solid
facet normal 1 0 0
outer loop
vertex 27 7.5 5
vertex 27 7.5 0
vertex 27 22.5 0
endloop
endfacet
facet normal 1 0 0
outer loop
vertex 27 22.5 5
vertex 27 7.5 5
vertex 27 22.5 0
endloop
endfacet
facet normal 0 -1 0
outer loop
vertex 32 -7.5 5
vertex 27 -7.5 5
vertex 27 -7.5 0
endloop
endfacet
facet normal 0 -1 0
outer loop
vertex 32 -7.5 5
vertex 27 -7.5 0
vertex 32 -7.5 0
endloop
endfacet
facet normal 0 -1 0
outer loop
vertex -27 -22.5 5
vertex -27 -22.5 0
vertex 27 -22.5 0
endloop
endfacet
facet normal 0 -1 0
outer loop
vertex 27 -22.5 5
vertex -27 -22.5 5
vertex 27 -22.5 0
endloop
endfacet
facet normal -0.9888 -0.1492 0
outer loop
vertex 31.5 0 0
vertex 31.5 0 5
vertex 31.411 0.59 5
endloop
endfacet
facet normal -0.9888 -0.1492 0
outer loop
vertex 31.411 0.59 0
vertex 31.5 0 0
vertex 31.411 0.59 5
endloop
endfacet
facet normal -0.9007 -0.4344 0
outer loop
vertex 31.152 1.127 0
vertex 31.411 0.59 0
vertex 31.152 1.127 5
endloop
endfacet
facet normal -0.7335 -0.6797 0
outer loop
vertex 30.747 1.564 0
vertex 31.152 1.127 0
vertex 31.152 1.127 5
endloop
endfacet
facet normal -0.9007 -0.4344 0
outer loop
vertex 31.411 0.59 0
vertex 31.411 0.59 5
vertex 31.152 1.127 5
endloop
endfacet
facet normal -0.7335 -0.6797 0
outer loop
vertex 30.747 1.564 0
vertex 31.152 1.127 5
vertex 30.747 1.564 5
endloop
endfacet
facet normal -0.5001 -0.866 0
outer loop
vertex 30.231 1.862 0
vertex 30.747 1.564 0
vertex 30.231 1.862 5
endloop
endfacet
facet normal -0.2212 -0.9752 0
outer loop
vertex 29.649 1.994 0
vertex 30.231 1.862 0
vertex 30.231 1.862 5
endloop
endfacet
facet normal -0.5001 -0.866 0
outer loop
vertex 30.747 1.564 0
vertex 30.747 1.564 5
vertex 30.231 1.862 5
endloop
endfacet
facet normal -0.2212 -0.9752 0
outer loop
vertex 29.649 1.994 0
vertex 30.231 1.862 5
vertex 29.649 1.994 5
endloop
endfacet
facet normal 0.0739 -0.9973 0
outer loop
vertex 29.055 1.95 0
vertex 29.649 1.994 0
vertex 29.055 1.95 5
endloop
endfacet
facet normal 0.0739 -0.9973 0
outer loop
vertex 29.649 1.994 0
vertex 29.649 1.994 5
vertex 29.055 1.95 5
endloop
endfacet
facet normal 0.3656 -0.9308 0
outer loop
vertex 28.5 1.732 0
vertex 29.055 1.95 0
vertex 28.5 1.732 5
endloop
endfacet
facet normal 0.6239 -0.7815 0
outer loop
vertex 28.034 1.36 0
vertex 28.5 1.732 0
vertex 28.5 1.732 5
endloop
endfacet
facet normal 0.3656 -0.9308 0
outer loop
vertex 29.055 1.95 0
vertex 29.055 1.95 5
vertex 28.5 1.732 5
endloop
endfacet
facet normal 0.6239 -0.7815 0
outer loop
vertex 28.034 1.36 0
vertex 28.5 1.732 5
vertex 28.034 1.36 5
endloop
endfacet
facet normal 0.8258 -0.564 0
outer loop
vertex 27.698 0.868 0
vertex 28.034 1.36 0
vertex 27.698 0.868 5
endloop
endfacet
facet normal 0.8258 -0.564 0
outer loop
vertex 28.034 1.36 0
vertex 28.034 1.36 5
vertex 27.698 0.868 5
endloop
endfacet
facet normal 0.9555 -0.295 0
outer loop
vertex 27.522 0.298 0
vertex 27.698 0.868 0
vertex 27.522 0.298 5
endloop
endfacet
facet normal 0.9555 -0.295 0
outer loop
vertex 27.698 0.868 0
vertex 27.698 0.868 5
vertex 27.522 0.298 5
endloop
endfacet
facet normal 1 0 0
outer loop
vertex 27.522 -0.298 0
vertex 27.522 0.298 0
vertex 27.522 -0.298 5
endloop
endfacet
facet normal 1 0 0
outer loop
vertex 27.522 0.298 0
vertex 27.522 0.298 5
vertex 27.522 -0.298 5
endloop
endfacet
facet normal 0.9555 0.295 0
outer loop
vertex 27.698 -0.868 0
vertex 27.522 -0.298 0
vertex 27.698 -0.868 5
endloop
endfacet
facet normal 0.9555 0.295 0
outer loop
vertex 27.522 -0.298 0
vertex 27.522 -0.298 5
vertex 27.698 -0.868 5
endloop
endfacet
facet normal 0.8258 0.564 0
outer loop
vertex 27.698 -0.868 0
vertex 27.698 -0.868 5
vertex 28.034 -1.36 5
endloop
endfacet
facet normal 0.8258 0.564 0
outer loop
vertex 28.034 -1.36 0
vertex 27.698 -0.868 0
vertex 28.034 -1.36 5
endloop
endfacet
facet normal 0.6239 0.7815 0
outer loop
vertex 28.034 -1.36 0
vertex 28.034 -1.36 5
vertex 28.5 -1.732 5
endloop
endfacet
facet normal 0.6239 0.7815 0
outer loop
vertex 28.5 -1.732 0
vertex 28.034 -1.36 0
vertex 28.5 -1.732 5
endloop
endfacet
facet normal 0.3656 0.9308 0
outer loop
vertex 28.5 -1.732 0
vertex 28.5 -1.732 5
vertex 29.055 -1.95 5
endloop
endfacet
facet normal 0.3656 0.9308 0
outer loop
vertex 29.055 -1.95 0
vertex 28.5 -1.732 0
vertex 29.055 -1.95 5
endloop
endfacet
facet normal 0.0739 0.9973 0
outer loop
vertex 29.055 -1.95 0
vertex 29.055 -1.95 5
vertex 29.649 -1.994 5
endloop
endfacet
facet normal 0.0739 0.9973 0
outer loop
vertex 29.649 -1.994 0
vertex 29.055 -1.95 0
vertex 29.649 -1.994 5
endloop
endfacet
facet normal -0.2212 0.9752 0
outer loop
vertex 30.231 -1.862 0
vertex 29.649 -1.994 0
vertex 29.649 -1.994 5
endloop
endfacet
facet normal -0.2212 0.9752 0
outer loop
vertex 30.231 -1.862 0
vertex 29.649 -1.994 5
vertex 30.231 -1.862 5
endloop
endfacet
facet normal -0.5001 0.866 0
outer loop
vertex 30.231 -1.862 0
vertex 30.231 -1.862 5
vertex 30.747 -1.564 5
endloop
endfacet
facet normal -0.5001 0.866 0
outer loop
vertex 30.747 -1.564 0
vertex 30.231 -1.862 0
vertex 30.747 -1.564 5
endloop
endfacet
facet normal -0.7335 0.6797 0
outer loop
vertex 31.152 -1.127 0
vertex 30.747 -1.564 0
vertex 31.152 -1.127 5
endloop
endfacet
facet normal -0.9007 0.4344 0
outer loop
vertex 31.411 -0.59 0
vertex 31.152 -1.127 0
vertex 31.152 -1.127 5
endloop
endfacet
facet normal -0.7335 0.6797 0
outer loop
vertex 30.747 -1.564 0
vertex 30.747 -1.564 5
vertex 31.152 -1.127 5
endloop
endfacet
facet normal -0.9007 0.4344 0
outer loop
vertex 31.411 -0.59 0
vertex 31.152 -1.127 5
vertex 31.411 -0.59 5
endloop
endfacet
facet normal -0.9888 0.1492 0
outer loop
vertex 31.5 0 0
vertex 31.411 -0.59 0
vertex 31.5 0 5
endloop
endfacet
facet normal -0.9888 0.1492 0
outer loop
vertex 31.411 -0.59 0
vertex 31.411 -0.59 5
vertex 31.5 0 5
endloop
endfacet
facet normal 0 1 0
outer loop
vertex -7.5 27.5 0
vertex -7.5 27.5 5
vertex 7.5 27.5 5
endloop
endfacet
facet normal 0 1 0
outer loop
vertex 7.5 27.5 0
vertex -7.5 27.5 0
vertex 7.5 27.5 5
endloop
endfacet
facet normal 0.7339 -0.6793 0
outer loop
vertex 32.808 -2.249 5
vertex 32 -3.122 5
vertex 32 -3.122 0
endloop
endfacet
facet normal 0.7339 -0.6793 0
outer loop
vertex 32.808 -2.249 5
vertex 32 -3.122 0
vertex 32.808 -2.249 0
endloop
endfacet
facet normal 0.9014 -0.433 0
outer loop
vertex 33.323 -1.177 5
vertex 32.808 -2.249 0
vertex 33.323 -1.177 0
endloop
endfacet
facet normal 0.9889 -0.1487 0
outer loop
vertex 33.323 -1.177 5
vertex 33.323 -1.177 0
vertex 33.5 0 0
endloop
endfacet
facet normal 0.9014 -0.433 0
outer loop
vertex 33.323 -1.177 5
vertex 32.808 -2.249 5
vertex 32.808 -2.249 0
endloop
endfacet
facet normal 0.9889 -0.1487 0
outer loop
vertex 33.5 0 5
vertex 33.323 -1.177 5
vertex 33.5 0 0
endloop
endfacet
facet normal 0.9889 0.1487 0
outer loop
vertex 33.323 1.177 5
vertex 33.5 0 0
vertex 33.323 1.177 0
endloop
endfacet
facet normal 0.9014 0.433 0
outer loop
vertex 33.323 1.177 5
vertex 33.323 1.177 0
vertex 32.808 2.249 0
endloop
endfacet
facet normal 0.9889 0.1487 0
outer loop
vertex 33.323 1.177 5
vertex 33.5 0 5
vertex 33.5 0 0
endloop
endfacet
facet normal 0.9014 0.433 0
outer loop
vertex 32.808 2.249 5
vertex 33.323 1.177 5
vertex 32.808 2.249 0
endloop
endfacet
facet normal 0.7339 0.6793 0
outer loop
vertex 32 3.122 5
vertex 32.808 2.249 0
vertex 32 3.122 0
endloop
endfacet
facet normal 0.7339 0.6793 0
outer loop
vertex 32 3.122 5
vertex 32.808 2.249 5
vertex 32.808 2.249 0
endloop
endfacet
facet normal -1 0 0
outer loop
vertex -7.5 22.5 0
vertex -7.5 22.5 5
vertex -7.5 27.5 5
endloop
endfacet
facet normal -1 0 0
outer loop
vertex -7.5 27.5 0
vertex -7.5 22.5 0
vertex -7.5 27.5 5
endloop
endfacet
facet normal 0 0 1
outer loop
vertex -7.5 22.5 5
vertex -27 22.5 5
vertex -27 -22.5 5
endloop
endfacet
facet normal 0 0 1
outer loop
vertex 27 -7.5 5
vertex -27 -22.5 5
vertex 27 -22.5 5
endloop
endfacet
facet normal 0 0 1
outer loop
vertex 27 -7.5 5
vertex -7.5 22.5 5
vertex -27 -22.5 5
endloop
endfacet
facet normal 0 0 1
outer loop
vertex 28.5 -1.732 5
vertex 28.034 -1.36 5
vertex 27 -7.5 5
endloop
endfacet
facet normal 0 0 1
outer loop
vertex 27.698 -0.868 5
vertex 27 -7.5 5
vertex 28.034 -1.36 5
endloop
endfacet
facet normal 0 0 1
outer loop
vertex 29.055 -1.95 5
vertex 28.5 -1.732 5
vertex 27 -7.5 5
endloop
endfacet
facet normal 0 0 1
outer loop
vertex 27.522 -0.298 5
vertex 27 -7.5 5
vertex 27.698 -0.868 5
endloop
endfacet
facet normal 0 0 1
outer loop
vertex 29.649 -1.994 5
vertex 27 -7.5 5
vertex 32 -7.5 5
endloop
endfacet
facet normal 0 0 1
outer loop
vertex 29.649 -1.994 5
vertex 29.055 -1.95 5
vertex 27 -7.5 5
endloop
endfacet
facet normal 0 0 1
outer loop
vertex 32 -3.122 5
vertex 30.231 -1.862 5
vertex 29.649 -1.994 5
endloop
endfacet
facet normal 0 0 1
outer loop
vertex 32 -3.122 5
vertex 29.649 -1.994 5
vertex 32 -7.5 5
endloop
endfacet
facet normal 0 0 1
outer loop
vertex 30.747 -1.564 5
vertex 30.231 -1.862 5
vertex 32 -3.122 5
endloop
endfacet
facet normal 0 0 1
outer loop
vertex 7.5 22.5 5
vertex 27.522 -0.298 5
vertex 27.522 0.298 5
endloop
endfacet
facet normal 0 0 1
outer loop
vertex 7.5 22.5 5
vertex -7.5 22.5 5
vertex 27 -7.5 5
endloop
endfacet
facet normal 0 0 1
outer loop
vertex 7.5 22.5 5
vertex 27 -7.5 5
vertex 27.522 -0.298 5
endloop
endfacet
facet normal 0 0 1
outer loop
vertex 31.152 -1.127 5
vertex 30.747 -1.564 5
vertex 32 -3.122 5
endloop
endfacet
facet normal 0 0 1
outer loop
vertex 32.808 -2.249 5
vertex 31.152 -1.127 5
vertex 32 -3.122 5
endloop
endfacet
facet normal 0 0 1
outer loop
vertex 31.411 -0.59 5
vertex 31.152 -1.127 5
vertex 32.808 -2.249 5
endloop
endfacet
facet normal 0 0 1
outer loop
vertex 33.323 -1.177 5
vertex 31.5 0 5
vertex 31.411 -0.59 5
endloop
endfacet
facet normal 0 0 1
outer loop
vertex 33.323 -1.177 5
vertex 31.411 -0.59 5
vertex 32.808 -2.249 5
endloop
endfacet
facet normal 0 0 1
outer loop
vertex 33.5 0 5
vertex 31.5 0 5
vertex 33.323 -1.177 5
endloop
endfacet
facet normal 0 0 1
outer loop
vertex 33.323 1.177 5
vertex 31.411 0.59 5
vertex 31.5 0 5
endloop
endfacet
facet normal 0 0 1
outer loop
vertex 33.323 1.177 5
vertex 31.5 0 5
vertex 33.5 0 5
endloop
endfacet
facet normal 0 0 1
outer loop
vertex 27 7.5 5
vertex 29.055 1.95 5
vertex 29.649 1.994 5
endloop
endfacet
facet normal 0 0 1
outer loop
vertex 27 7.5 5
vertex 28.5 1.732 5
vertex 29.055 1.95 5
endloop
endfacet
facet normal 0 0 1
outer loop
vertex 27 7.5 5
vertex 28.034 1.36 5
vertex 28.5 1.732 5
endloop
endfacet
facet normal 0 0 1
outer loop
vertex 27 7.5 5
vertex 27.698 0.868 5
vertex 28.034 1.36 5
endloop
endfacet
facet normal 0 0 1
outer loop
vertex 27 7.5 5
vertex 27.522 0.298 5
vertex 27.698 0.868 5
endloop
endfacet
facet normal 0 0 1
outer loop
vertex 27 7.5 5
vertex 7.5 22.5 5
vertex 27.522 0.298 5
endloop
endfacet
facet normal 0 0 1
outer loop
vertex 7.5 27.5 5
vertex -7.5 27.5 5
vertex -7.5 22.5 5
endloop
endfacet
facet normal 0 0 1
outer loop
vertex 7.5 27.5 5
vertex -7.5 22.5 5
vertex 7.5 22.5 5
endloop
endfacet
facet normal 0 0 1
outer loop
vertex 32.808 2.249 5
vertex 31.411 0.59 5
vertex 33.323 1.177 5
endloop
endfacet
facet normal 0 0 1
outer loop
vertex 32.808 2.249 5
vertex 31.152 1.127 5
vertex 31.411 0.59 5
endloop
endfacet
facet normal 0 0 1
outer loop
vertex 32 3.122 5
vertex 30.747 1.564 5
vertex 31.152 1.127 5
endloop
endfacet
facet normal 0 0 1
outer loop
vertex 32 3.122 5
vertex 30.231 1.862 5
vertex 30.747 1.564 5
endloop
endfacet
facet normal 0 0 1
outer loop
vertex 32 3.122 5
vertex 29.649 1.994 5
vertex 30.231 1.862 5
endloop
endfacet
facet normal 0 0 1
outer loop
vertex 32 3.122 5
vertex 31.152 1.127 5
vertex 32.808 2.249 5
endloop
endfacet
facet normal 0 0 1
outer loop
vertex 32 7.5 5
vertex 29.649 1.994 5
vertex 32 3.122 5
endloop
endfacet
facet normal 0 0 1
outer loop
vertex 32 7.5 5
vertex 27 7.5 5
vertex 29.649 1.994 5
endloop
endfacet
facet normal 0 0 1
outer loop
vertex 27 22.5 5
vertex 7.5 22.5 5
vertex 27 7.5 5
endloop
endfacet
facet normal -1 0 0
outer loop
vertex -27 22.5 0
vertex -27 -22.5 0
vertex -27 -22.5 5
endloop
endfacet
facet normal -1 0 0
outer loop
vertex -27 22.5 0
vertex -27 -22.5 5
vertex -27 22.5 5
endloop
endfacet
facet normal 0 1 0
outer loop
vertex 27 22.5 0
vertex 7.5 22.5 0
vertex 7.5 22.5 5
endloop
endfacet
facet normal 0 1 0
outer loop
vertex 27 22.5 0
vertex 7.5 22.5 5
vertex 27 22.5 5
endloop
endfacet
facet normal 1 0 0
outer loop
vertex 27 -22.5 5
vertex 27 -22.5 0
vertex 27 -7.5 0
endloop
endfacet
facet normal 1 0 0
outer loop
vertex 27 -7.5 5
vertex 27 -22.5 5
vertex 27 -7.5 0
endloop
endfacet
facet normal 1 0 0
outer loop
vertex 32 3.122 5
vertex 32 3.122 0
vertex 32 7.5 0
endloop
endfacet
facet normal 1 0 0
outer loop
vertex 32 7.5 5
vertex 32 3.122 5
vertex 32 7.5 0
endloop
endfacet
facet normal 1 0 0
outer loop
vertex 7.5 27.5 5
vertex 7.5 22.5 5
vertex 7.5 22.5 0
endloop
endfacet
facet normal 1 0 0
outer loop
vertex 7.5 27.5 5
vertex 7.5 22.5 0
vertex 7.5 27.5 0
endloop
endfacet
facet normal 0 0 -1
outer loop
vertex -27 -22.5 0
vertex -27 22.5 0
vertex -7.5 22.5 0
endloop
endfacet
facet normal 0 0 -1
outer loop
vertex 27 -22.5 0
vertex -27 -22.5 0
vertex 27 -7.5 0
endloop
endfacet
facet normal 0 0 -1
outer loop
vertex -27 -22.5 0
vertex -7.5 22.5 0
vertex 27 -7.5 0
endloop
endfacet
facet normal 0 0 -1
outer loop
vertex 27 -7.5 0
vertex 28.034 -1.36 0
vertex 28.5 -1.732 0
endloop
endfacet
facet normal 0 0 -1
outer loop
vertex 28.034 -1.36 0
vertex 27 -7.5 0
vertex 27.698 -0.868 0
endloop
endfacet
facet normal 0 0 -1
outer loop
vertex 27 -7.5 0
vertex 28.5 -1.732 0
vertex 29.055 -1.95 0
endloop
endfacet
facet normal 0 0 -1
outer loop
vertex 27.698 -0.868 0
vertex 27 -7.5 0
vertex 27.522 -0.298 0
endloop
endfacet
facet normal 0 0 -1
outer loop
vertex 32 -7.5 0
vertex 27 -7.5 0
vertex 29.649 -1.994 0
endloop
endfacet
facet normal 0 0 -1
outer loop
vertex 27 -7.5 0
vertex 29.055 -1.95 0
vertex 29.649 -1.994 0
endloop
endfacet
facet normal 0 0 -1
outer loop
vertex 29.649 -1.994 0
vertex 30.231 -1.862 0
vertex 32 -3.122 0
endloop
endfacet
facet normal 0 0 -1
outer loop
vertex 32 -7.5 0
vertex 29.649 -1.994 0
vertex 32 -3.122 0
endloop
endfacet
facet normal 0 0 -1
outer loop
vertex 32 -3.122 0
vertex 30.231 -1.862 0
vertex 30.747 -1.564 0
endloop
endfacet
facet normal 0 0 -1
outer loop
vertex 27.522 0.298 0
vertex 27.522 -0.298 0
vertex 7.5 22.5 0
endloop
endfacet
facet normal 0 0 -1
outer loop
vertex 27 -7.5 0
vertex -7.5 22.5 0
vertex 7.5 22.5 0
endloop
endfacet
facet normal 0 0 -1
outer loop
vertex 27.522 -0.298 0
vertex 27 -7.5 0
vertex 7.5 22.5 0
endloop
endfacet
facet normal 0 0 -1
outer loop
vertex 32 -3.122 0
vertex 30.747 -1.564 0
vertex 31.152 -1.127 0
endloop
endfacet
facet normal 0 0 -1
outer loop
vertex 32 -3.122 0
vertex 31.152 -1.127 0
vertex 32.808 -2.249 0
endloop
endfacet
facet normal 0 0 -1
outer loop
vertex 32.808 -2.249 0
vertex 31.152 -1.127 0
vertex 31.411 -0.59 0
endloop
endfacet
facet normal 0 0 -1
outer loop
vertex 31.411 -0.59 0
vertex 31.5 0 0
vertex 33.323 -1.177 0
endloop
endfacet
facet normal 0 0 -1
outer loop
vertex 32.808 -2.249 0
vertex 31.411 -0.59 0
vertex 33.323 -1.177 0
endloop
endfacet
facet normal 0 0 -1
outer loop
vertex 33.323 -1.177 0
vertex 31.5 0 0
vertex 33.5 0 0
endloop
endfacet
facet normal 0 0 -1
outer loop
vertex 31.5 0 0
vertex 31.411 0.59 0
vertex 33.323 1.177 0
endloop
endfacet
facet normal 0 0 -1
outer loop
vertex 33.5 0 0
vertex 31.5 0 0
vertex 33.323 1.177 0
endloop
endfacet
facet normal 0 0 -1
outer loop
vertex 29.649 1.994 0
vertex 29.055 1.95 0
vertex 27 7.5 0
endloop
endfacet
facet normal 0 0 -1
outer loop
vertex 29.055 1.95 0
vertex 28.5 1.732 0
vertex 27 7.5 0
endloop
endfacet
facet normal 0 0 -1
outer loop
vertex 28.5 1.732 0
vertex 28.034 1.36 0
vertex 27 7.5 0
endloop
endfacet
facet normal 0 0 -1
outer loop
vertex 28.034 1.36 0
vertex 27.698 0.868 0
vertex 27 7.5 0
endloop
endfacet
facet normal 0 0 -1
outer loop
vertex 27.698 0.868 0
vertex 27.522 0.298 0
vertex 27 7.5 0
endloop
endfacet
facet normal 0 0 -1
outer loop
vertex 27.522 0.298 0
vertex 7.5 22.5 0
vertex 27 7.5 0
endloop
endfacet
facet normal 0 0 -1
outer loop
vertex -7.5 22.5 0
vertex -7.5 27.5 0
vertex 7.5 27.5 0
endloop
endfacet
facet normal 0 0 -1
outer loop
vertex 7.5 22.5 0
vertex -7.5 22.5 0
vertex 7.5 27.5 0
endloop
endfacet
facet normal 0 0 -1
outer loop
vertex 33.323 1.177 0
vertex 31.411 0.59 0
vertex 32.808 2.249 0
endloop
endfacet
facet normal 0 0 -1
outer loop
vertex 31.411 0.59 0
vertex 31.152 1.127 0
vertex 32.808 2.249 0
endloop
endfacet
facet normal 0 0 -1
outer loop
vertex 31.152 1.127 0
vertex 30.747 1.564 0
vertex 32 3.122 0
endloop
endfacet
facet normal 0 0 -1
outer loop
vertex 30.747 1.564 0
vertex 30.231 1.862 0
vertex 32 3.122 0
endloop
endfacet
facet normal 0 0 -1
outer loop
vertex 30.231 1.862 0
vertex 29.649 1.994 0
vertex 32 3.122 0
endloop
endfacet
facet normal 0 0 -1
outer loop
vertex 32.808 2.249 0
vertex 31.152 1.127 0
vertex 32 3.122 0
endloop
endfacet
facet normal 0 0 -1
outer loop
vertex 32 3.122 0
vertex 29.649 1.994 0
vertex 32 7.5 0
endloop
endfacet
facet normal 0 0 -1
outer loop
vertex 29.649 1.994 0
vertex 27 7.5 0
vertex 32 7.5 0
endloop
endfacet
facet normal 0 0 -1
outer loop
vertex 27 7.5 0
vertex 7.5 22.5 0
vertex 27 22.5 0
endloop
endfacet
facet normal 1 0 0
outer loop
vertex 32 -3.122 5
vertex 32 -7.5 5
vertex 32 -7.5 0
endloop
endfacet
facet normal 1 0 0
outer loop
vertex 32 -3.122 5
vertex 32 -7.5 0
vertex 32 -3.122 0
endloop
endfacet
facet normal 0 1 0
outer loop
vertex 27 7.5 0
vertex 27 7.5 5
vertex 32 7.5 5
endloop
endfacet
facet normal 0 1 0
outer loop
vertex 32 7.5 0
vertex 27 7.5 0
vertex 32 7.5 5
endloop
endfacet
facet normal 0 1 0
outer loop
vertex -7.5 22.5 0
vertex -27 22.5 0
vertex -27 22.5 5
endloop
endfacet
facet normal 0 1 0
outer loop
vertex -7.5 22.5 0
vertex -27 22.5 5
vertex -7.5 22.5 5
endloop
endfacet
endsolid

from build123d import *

# Parameters (mm, degrees)
SKETCH1_W           = 54
SKETCH1_H           = 45
BOSS_EXTRUDE1_DEPTH = 5
SKETCH3_W           = 5
SKETCH3_H           = 15
SKETCH3_W_2         = 15
SKETCH3_H_2         = 5
BOSS_EXTRUDE2_DEPTH = 5
SKETCH4_R           = 2
CUT_EXTRUDE1_DEPTH  = 5
SKETCH5_R           = 4
SKETCH5_R_2         = 2
BOSS_EXTRUDE3_DEPTH = 5


with BuildPart() as part:
    # Sketch1 → Boss-Extrude1 (new body)
    with BuildSketch(Plane.XY):
        Rectangle(SKETCH1_W, SKETCH1_H)
    extrude(amount=BOSS_EXTRUDE1_DEPTH)

    # Sketch3 → Boss-Extrude2 (add)
    with BuildSketch(Plane.XY.offset(5)):
        with Locations((29.5, 0)):
            Rectangle(SKETCH3_W, SKETCH3_H)
        with Locations((0, 25)):
            Rectangle(SKETCH3_W_2, SKETCH3_H_2)
    extrude(amount=-BOSS_EXTRUDE2_DEPTH)

    # Sketch4 → Cut-Extrude1 (cut)
    with BuildSketch(Plane.XY.offset(5)):
        with Locations((29.5, 0)):
            Circle(SKETCH4_R)
    extrude(amount=-CUT_EXTRUDE1_DEPTH, mode=Mode.SUBTRACT)

    # Sketch5 → Boss-Extrude3 (add)
    with BuildSketch(Plane.XY.offset(5)):
        with Locations((29.5, 0)):
            Circle(SKETCH5_R)
        with Locations((29.5, 0)):
            Circle(SKETCH5_R_2, mode=Mode.SUBTRACT)
    extrude(amount=-BOSS_EXTRUDE3_DEPTH)


solid = part.part
